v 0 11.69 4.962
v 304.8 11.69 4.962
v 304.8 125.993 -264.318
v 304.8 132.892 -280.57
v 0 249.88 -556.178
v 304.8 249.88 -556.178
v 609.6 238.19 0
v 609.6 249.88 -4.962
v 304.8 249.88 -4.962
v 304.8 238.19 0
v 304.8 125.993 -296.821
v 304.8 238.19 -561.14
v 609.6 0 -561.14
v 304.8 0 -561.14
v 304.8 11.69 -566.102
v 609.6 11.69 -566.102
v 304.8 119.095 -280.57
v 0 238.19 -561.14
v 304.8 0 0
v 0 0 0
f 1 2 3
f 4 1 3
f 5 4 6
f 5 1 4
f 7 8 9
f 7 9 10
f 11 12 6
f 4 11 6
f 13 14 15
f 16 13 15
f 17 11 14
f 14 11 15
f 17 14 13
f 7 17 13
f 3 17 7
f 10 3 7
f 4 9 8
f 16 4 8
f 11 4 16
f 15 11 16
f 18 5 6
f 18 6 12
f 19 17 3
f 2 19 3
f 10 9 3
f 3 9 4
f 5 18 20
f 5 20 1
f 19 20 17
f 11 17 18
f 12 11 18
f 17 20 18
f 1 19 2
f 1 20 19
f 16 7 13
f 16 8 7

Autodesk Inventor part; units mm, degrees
ref_plane "YZ Plane" through (0, 0, 0) normal (1, 0, 0) x (0, 1, 0)
ref_plane "XZ Plane" through (0, 0, 0) normal (0, 1, 0) x (-1, 0, 0)
ref_plane "XY Plane" through (0, 0, 0) normal (0, 0, 1) x (1, 0, 0)
sketch "Sketch1" plane through (0, 0, 0) normal (1, 0, 0) x (0, 1, 0)
  line L0 (0, 0) -> (238.1897, -561.1398)
  line L1 (0, 0) -> (0, -331.1226) construction
  line L2 (0, 0) -> (11.6904, 4.9623)
  line L3 (11.6904, 4.9623) -> (249.8801, -556.1775)
  line L4 (249.8801, -556.1775) -> (238.1897, -561.1398)
  dimension "d0" = 609.6
  dimension "d2" = 23
  dimension "d3" = 12.7
extrude "Extrusion1" add sketch "Sketch1" along normal blind 304.8
sketch "Sketch2" plane through (304.8, 0, 0) normal (1, 0, 0) x (0, 0, -1)
  line L0 (0, 0) -> (561.1398, 238.1897) projected
  line L1 (561.1398, 0) -> (0, 238.1897)
  line L2 (561.1398, 0) -> (392.1686, 0) construction
  line L3 (4.9623, 249.8801) -> (566.102, 11.6904)
  line L4 (4.9623, 249.8801) -> (0, 238.1897)
  line L5 (561.1398, 0) -> (566.102, 11.6904)
  dimension "d6" = 23
  dimension "d7" = 12.7
  dimension "d8" = 609.6
extrude "Extrusion2" add sketch "Sketch2" along normal blind 304.8
properties part number "SeeSaw"
